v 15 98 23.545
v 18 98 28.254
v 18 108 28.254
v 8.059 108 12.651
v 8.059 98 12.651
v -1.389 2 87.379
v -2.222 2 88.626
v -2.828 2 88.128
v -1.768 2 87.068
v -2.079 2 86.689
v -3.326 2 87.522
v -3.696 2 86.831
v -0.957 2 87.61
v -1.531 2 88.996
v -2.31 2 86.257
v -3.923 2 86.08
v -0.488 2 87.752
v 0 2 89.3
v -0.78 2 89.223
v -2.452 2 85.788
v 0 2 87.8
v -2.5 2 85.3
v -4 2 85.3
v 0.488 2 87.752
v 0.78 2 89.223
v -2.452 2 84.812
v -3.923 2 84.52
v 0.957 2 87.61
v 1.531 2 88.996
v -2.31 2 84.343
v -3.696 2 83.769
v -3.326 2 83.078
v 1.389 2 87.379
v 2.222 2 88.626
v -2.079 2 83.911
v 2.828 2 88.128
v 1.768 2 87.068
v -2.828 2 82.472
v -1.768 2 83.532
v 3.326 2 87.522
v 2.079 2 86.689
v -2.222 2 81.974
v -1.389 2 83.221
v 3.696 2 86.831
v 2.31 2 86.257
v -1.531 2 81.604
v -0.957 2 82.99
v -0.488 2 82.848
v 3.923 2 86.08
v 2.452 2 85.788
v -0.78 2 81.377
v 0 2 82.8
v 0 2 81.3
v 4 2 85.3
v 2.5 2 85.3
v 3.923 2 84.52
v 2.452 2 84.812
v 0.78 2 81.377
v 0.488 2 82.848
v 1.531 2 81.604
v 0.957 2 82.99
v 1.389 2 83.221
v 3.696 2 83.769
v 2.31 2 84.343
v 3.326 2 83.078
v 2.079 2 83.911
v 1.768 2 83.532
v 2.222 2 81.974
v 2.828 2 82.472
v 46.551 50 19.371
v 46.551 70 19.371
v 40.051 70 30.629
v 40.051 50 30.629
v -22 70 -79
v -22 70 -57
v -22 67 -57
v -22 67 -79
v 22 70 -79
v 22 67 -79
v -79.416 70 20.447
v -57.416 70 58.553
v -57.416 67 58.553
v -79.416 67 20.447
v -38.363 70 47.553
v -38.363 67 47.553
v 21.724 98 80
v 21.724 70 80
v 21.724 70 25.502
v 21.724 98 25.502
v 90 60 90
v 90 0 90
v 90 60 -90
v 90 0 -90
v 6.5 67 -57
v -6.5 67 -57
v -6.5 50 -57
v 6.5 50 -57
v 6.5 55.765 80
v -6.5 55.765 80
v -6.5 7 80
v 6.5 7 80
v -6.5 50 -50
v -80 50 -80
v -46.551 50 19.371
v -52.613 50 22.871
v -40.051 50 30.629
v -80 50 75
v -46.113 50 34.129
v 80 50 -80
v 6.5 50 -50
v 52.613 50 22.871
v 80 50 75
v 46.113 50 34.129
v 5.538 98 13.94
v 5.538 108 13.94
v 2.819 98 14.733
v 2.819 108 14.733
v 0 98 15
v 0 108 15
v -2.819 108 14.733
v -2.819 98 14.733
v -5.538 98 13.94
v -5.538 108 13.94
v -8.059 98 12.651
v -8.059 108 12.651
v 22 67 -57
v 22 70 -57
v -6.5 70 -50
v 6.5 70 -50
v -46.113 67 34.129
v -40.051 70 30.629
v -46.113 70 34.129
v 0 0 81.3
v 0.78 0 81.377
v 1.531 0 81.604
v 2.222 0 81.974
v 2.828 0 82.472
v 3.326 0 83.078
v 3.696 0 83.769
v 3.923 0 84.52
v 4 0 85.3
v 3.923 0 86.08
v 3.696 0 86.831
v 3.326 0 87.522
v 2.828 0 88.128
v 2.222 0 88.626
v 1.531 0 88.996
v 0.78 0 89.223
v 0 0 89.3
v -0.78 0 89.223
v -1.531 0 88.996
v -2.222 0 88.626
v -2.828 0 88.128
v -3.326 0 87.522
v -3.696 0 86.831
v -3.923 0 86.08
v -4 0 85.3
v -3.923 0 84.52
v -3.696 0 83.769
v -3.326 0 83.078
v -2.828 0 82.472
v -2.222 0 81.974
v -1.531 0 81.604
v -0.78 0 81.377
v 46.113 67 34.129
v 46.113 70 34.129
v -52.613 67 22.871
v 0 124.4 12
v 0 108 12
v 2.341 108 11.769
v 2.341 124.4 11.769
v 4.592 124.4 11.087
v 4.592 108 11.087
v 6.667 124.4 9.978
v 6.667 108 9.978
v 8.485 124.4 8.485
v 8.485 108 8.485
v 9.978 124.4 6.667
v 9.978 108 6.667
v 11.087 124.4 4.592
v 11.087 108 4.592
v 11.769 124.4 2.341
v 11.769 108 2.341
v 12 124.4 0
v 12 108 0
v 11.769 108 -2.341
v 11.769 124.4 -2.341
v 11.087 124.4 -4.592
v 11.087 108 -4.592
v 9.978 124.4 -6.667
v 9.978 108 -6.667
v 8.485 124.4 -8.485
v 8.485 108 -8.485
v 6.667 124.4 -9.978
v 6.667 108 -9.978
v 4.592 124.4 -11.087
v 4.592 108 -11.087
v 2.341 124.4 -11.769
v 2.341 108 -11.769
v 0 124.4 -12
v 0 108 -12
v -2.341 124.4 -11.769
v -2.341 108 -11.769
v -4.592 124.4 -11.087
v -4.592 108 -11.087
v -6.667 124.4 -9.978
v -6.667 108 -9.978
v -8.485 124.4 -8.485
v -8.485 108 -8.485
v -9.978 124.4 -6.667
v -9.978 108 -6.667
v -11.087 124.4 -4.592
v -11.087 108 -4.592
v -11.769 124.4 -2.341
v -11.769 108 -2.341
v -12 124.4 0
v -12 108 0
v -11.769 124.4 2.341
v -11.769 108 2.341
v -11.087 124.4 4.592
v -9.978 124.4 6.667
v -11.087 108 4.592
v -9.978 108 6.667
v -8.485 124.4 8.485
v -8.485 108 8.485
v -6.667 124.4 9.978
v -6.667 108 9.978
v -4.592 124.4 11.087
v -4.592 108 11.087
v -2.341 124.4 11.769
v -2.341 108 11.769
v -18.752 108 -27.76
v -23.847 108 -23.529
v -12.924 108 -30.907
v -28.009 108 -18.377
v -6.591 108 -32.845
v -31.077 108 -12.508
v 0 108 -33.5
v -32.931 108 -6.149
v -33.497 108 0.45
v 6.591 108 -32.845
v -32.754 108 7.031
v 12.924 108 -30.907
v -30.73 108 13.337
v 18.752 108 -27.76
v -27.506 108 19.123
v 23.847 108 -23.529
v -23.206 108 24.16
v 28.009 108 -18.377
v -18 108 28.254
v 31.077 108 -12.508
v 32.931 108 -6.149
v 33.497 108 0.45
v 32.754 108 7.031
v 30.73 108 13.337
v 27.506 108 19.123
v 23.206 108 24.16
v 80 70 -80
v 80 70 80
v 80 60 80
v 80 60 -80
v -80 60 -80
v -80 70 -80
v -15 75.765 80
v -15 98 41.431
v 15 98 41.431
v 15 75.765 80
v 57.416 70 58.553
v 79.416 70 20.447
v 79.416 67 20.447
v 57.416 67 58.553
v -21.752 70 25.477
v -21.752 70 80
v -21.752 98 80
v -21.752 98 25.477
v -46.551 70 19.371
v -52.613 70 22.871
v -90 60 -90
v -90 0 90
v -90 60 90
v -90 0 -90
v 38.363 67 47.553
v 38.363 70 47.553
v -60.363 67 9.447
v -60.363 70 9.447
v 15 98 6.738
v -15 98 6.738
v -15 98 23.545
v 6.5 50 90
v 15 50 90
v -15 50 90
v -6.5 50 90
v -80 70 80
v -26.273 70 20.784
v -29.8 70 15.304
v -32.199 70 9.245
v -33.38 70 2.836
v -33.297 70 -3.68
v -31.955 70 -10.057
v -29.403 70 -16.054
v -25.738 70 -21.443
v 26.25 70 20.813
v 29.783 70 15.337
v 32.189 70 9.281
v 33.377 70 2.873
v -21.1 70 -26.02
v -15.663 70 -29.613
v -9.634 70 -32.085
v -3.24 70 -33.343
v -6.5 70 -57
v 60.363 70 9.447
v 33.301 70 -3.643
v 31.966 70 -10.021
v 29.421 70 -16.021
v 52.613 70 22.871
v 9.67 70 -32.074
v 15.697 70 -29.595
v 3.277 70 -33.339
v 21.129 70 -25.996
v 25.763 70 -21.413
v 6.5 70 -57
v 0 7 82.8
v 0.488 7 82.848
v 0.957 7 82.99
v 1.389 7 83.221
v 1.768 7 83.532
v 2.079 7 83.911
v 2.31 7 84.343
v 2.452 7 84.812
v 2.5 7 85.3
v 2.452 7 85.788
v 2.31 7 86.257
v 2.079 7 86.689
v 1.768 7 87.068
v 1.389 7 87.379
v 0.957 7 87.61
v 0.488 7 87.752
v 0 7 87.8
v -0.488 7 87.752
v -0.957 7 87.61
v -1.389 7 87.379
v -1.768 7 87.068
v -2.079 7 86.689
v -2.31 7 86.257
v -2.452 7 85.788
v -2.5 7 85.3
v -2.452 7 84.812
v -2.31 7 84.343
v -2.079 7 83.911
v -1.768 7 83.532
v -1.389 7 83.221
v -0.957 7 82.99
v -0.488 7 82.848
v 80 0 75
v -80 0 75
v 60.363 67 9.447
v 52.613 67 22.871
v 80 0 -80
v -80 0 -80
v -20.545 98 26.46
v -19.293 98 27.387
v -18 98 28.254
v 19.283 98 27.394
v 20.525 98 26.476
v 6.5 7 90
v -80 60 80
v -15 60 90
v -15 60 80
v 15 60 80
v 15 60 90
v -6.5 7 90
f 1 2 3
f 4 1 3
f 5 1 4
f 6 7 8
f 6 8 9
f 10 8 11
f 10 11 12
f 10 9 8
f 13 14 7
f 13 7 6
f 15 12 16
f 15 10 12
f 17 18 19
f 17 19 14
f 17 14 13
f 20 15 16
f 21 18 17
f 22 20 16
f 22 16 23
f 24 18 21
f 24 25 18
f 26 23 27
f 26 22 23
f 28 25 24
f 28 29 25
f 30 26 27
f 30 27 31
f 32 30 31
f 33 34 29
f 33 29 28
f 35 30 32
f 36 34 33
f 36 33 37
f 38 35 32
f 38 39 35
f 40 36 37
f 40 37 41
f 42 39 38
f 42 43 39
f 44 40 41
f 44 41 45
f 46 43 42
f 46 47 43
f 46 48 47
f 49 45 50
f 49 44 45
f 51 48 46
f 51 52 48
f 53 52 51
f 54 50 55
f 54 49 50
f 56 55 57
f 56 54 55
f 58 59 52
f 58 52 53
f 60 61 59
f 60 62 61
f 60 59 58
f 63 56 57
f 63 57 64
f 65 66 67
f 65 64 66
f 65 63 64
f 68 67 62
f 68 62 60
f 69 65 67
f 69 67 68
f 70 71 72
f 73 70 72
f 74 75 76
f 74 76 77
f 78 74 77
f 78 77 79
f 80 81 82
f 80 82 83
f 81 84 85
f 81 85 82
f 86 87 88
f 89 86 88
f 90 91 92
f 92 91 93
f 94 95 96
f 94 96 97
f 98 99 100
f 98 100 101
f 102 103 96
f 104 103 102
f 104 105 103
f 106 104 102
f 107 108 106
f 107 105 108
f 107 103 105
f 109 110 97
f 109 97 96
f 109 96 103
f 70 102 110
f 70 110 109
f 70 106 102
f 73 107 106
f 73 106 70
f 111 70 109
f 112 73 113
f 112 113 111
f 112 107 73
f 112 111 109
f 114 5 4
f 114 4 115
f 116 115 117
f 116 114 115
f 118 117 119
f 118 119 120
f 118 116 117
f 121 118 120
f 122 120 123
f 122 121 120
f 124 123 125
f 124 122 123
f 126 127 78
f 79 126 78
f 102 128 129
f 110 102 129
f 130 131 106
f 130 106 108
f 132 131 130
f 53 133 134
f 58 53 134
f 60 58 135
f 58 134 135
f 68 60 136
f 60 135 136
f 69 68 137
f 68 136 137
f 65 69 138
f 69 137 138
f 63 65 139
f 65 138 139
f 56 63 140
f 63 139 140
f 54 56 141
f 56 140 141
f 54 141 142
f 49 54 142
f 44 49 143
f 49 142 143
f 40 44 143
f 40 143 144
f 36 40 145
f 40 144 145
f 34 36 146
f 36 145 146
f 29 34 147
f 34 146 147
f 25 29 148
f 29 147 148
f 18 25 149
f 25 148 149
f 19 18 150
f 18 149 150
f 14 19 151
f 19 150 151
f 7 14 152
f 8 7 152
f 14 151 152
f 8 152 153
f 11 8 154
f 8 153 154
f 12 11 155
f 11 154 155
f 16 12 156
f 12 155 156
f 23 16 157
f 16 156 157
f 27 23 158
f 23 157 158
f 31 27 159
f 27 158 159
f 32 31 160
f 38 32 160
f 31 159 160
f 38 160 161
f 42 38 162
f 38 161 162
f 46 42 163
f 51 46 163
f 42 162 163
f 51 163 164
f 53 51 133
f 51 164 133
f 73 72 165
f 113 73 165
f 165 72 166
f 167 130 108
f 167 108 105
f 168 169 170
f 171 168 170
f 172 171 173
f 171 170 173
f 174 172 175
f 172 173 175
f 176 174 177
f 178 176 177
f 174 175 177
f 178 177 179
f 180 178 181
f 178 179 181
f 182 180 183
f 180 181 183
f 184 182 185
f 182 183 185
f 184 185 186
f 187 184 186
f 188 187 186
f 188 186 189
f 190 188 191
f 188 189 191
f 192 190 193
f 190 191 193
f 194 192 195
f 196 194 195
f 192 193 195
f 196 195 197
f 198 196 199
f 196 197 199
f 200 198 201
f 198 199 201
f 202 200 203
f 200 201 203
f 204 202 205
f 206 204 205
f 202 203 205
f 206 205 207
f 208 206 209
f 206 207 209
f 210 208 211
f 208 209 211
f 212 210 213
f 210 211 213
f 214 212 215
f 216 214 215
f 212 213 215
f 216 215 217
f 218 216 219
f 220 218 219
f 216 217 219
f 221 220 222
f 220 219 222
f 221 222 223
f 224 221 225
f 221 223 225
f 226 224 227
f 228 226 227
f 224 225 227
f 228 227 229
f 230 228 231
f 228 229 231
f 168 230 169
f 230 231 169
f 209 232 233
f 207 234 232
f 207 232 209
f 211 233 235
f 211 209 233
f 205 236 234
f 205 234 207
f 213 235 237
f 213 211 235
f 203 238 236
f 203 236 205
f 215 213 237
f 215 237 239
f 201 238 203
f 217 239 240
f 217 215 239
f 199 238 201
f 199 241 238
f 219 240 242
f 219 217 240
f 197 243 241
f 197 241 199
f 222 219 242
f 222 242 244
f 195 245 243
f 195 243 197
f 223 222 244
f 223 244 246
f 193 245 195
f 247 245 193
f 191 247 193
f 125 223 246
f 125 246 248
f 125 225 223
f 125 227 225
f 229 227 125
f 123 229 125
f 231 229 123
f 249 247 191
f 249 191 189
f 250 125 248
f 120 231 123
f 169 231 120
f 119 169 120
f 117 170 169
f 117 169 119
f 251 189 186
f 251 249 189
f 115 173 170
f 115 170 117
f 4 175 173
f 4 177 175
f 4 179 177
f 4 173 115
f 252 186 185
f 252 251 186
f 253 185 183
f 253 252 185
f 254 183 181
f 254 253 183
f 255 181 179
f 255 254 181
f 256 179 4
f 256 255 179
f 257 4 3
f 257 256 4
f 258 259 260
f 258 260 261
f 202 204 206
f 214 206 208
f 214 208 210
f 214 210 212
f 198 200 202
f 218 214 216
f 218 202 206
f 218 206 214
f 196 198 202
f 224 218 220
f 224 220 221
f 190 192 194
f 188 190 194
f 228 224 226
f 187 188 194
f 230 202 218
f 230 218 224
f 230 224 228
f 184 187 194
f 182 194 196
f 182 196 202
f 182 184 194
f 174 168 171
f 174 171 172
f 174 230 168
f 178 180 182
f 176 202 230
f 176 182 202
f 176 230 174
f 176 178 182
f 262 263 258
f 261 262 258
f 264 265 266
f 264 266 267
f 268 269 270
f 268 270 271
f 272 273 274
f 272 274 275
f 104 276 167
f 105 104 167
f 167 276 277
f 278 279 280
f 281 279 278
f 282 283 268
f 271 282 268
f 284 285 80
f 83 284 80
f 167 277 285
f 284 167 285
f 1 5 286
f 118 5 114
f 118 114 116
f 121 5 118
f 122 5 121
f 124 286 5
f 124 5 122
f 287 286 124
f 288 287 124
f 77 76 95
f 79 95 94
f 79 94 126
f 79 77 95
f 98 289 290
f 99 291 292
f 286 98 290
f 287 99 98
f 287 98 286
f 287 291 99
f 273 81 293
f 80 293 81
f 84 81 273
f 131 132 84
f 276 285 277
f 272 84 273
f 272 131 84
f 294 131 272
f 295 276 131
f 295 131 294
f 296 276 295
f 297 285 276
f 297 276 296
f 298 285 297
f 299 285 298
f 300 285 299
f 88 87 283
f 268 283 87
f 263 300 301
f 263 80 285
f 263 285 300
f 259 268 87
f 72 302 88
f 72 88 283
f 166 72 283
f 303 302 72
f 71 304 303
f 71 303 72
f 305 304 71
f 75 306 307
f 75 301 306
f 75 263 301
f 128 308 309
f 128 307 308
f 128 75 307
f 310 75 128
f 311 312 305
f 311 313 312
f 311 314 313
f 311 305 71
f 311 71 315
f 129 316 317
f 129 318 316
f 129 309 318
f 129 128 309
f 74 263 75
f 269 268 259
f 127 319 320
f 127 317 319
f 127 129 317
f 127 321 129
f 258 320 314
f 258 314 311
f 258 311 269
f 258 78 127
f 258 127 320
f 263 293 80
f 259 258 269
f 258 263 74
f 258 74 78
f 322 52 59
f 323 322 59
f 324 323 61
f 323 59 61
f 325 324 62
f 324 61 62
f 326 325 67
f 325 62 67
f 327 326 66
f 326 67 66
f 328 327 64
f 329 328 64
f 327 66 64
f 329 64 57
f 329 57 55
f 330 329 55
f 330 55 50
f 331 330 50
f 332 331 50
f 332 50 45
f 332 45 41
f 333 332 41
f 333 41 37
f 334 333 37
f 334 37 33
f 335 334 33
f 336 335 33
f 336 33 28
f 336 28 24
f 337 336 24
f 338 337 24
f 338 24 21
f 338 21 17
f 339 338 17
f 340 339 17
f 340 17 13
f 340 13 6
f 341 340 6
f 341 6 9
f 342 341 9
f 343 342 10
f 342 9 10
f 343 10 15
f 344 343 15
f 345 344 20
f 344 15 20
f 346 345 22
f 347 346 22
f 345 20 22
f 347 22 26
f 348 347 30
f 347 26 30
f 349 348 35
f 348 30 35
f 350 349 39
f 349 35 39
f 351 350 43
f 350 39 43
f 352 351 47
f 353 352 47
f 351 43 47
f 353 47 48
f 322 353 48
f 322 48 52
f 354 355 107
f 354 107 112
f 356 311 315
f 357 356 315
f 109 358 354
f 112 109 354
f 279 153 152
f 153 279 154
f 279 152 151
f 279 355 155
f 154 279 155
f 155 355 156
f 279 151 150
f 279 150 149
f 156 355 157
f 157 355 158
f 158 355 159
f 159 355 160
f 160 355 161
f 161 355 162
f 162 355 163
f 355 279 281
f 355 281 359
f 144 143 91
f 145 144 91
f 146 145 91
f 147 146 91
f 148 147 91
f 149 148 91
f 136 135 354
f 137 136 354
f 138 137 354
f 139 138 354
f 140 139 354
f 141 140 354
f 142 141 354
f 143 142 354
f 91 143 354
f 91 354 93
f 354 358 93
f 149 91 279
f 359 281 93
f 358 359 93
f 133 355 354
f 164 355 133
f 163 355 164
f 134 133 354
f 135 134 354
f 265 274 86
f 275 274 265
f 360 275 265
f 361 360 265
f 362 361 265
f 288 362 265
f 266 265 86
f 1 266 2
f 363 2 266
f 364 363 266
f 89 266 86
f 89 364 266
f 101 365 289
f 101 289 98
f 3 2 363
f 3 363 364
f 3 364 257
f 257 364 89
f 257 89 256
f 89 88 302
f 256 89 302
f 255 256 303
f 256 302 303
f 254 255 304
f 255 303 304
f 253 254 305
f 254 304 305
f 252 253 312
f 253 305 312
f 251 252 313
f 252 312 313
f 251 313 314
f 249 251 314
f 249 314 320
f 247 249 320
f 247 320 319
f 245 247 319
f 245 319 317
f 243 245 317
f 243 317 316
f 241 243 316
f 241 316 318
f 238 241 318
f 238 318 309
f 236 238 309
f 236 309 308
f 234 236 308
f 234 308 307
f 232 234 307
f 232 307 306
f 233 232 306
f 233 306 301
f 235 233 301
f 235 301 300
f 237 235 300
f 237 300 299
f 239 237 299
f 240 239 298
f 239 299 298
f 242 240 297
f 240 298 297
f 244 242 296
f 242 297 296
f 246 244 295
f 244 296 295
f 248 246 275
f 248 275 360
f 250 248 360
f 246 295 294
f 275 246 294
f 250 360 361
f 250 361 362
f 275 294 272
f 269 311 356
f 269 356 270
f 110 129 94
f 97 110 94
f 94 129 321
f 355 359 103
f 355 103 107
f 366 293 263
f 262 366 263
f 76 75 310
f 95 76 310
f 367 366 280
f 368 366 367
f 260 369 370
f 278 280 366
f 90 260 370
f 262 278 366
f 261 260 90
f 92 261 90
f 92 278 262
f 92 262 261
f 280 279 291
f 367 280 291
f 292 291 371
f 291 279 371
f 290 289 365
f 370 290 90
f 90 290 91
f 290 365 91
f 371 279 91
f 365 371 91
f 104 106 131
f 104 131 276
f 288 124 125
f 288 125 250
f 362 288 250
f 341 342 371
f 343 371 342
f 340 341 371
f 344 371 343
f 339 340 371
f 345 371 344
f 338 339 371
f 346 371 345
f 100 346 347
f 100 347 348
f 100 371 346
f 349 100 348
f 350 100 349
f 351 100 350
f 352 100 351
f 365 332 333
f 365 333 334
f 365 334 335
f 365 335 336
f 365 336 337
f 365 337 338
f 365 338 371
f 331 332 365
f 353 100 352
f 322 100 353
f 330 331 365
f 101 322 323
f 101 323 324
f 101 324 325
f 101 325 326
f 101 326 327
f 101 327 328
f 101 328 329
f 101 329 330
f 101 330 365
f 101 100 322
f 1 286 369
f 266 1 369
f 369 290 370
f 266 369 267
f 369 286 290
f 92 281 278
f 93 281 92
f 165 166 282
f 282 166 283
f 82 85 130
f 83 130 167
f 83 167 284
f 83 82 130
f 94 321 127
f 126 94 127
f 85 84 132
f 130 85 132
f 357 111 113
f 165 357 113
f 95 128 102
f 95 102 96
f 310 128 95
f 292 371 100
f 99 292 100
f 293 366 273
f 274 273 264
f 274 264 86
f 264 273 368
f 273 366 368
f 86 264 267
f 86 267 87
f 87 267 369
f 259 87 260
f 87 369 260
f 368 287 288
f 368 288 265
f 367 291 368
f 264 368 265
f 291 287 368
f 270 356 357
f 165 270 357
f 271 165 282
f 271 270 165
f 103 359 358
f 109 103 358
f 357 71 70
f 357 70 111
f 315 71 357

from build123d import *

# Parameters (mm, degrees)
SKETCH_3_W               = 180
SKETCH_3_H               = 180
EXTRUDE_1_DEPTH          = 70
SKETCH_5_OUTSIDE_W       = 234.802
SKETCH_5_OUTSIDE_H       = 234.802
SKETCH_5_OUTSIDE_W_2     = 160
SKETCH_5_OUTSIDE_H_2     = 160
CUT_EXTRUDE_1_DEPTH      = 10
SKETCH_6_W               = 13
SKETCH_6_H               = 10
CUT_EXTRUDE_2_DEPTH      = 53
CUT_EXTRUDE_3_REACH      = 147.258
SKETCH_7_R               = 2.5
SKETCH_8_R               = 4
CUT_EXTRUDE_4_DEPTH      = 2
SKETCH_9_R               = 33.5
EXTRUDE_2_DEPTH          = 38
SKETCH_10_R              = 12
EXTRUDE_3_DEPTH          = 16.4
SKETCH_11_W              = 44
SKETCH_11_H              = 22
CUT_EXTRUDE_5_DEPTH      = 3
PATTERN_CIRCULAR_1_COUNT = 3
CUT_EXTRUDE_6_REACH      = 147.258
SKETCH_12_W              = 13
SKETCH_12_H              = 7
PATTERN_CIRCULAR_2_COUNT = 3
SKETCH_13_W              = 160
SKETCH_13_H              = 155
CUT_EXTRUDE_7_DEPTH      = 50
CUT_EXTRUDE_START        = -10
CUT_EXTRUDE_8_DEPTH      = 10
SKETCH_20_W              = 43.47623614
SKETCH_20_H              = 54.53887657
EXTRUDE_4_DEPTH          = 28
SWEEP_START              = -15
SWEEP_2_DEPTH            = 30


# Read off the part's stored shape, not the designer's step: 切除-扫描2
with BuildPart() as part:
    # 草图3 → 凸台-拉伸1 (new body)
    with BuildSketch(Plane(origin=(0, 0, 0), x_dir=(1, 0, 0), z_dir=(0, 1, 0))):
        Rectangle(SKETCH_3_W, SKETCH_3_H)
    extrude(amount=EXTRUDE_1_DEPTH)

    # 草图5 outside → 切除-拉伸1 (cut)
    with BuildSketch(Plane(origin=(0, 70, 0), x_dir=(1, 0, 0), z_dir=(0, 1, 0))):
        Rectangle(SKETCH_5_OUTSIDE_W, SKETCH_5_OUTSIDE_H)
        Rectangle(SKETCH_5_OUTSIDE_W_2, SKETCH_5_OUTSIDE_H_2, mode=Mode.SUBTRACT)
    extrude(amount=-CUT_EXTRUDE_1_DEPTH, mode=Mode.SUBTRACT)

    # 草图6 → 切除-拉伸2 (cut)
    with BuildSketch(Plane(origin=(0, 60, 0), x_dir=(1, 0, 0), z_dir=(0, 1, 0))):
        with Locations((0, -85)):
            Rectangle(SKETCH_6_W, SKETCH_6_H)
    extrude(amount=-CUT_EXTRUDE_2_DEPTH, mode=Mode.SUBTRACT)

    # 草图7 → 切除-拉伸3 (cut, up to next)
    with BuildSketch(Plane.XZ, mode=Mode.PRIVATE) as cut_extrude_3_sk1:
        with Locations(Location((0, 85.3, 0), (0, 0, 270))):
            Circle(SKETCH_7_R)
    cut_extrude_3_tool1 = extrude(cut_extrude_3_sk1.sketch, amount=-CUT_EXTRUDE_3_REACH, mode=Mode.PRIVATE) & part.part
    add(cut_extrude_3_tool1.solids().sort_by_distance((0, 0, 85.3))[0], mode=Mode.SUBTRACT)

    # 草图8 → 切除-拉伸4 (cut)
    with BuildSketch(Plane.XZ):
        with Locations(Location((0, 85.3, 0), (0, 0, 270))):
            Circle(SKETCH_8_R)
    extrude(amount=-CUT_EXTRUDE_4_DEPTH, mode=Mode.SUBTRACT)

    # 草图9 → 凸台-拉伸2 (add)
    with BuildSketch(Plane(origin=(0, 70, 0), x_dir=(1, 0, 0), z_dir=(0, 1, 0))):
        with Locations(Location((0, 0, 0), (0, 0, 270))):
            Circle(SKETCH_9_R)
    extrude(amount=EXTRUDE_2_DEPTH)

    # 草图10 → 凸台-拉伸3 (add)
    with BuildSketch(Plane(origin=(0, 108, 0), x_dir=(1, 0, 0), z_dir=(0, 1, 0))):
        with Locations(Location((0, 0, 0), (0, 0, 270))):
            Circle(SKETCH_10_R)
    extrude(amount=EXTRUDE_3_DEPTH)

    # 草图11 → 切除-拉伸5 (cut)
    with BuildSketch(Plane(origin=(0, 70, 0), x_dir=(1, 0, 0), z_dir=(0, 1, 0))):
        with Locations((0, 68)):
            Rectangle(SKETCH_11_W, SKETCH_11_H)
    cut_extrude_5 = extrude(amount=-CUT_EXTRUDE_5_DEPTH, mode=Mode.SUBTRACT)

    # 阵列(圆周)1: 切除-拉伸5 ×3 about axis
    pattern_circular_1_axis = Axis((0, 0, 0), (0, 1, 0))
    for i in range(1, PATTERN_CIRCULAR_1_COUNT):
        add(cut_extrude_5.rotate(pattern_circular_1_axis, i * 360 / PATTERN_CIRCULAR_1_COUNT), mode=Mode.SUBTRACT)

    # 草图12 → 切除-拉伸6 (cut, up to next)
    with BuildSketch(Plane(origin=(0, 70, 0), x_dir=(1, 0, 0), z_dir=(0, 1, 0)), mode=Mode.PRIVATE) as cut_extrude_6_sk1:
        with Locations((0, 53.5)):
            Rectangle(SKETCH_12_W, SKETCH_12_H)
    cut_extrude_6_tool1 = extrude(cut_extrude_6_sk1.sketch, amount=-CUT_EXTRUDE_6_REACH, mode=Mode.PRIVATE) & part.part
    cut_extrude_6 = cut_extrude_6_tool1.solids().sort_by_distance((0, 70, -53.5))[0]
    add(cut_extrude_6, mode=Mode.SUBTRACT)

    # 阵列(圆周)2: 切除-拉伸6 ×3 about axis
    pattern_circular_2_axis = Axis((0, 0, 0), (0, 1, 0))
    for i in range(1, PATTERN_CIRCULAR_2_COUNT):
        add(cut_extrude_6.rotate(pattern_circular_2_axis, i * 360 / PATTERN_CIRCULAR_2_COUNT), mode=Mode.SUBTRACT)

    # 草图13 → 切除-拉伸7 (cut)
    with BuildSketch(Plane.XZ):
        with Locations((0, -2.5)):
            Rectangle(SKETCH_13_W, SKETCH_13_H)
    extrude(amount=-CUT_EXTRUDE_7_DEPTH, mode=Mode.SUBTRACT)

    # 草图14 → 切除-拉伸8 (cut)
    with BuildSketch(Plane(origin=(0, 108, 0), x_dir=(1, 0, 0), z_dir=(0, 1, 0)).offset(CUT_EXTRUDE_START)):
        with BuildLine():
            Line((-8.059494125, -12.650871687), (-17.99953688, -28.253613435))
            ThreePointArc((-17.99953688, -28.253613435), (0, -33.5), (17.99953688, -28.253613435))
            Line((17.99953688, -28.253613435), (8.059494125, -12.650871687))
            ThreePointArc((8.059494125, -12.650871687), (0, -15), (-8.059494125, -12.650871687))
        make_face()
    extrude(amount=CUT_EXTRUDE_8_DEPTH, mode=Mode.SUBTRACT)

    # 草图20 → 凸台-拉伸4 (add)
    with BuildSketch(Plane(origin=(0, 70, 0), x_dir=(1, 0, 0), z_dir=(0, 1, 0))):
        with Locations((-0.01436765, -52.730561715)):
            Rectangle(SKETCH_20_W, SKETCH_20_H)
    extrude(amount=EXTRUDE_4_DEPTH)

    # 切除-扫描2 outline → 切除-扫描2 (cut)
    with BuildSketch(Plane.YZ.offset(SWEEP_START)):
        Polygon((98, 6.738189634), (98, 41.43061062), (75.764947914, 80), (60, 80), (60, 90), (50, 90), align=None)
    extrude(amount=SWEEP_2_DEPTH, mode=Mode.SUBTRACT)


solid = part.part
